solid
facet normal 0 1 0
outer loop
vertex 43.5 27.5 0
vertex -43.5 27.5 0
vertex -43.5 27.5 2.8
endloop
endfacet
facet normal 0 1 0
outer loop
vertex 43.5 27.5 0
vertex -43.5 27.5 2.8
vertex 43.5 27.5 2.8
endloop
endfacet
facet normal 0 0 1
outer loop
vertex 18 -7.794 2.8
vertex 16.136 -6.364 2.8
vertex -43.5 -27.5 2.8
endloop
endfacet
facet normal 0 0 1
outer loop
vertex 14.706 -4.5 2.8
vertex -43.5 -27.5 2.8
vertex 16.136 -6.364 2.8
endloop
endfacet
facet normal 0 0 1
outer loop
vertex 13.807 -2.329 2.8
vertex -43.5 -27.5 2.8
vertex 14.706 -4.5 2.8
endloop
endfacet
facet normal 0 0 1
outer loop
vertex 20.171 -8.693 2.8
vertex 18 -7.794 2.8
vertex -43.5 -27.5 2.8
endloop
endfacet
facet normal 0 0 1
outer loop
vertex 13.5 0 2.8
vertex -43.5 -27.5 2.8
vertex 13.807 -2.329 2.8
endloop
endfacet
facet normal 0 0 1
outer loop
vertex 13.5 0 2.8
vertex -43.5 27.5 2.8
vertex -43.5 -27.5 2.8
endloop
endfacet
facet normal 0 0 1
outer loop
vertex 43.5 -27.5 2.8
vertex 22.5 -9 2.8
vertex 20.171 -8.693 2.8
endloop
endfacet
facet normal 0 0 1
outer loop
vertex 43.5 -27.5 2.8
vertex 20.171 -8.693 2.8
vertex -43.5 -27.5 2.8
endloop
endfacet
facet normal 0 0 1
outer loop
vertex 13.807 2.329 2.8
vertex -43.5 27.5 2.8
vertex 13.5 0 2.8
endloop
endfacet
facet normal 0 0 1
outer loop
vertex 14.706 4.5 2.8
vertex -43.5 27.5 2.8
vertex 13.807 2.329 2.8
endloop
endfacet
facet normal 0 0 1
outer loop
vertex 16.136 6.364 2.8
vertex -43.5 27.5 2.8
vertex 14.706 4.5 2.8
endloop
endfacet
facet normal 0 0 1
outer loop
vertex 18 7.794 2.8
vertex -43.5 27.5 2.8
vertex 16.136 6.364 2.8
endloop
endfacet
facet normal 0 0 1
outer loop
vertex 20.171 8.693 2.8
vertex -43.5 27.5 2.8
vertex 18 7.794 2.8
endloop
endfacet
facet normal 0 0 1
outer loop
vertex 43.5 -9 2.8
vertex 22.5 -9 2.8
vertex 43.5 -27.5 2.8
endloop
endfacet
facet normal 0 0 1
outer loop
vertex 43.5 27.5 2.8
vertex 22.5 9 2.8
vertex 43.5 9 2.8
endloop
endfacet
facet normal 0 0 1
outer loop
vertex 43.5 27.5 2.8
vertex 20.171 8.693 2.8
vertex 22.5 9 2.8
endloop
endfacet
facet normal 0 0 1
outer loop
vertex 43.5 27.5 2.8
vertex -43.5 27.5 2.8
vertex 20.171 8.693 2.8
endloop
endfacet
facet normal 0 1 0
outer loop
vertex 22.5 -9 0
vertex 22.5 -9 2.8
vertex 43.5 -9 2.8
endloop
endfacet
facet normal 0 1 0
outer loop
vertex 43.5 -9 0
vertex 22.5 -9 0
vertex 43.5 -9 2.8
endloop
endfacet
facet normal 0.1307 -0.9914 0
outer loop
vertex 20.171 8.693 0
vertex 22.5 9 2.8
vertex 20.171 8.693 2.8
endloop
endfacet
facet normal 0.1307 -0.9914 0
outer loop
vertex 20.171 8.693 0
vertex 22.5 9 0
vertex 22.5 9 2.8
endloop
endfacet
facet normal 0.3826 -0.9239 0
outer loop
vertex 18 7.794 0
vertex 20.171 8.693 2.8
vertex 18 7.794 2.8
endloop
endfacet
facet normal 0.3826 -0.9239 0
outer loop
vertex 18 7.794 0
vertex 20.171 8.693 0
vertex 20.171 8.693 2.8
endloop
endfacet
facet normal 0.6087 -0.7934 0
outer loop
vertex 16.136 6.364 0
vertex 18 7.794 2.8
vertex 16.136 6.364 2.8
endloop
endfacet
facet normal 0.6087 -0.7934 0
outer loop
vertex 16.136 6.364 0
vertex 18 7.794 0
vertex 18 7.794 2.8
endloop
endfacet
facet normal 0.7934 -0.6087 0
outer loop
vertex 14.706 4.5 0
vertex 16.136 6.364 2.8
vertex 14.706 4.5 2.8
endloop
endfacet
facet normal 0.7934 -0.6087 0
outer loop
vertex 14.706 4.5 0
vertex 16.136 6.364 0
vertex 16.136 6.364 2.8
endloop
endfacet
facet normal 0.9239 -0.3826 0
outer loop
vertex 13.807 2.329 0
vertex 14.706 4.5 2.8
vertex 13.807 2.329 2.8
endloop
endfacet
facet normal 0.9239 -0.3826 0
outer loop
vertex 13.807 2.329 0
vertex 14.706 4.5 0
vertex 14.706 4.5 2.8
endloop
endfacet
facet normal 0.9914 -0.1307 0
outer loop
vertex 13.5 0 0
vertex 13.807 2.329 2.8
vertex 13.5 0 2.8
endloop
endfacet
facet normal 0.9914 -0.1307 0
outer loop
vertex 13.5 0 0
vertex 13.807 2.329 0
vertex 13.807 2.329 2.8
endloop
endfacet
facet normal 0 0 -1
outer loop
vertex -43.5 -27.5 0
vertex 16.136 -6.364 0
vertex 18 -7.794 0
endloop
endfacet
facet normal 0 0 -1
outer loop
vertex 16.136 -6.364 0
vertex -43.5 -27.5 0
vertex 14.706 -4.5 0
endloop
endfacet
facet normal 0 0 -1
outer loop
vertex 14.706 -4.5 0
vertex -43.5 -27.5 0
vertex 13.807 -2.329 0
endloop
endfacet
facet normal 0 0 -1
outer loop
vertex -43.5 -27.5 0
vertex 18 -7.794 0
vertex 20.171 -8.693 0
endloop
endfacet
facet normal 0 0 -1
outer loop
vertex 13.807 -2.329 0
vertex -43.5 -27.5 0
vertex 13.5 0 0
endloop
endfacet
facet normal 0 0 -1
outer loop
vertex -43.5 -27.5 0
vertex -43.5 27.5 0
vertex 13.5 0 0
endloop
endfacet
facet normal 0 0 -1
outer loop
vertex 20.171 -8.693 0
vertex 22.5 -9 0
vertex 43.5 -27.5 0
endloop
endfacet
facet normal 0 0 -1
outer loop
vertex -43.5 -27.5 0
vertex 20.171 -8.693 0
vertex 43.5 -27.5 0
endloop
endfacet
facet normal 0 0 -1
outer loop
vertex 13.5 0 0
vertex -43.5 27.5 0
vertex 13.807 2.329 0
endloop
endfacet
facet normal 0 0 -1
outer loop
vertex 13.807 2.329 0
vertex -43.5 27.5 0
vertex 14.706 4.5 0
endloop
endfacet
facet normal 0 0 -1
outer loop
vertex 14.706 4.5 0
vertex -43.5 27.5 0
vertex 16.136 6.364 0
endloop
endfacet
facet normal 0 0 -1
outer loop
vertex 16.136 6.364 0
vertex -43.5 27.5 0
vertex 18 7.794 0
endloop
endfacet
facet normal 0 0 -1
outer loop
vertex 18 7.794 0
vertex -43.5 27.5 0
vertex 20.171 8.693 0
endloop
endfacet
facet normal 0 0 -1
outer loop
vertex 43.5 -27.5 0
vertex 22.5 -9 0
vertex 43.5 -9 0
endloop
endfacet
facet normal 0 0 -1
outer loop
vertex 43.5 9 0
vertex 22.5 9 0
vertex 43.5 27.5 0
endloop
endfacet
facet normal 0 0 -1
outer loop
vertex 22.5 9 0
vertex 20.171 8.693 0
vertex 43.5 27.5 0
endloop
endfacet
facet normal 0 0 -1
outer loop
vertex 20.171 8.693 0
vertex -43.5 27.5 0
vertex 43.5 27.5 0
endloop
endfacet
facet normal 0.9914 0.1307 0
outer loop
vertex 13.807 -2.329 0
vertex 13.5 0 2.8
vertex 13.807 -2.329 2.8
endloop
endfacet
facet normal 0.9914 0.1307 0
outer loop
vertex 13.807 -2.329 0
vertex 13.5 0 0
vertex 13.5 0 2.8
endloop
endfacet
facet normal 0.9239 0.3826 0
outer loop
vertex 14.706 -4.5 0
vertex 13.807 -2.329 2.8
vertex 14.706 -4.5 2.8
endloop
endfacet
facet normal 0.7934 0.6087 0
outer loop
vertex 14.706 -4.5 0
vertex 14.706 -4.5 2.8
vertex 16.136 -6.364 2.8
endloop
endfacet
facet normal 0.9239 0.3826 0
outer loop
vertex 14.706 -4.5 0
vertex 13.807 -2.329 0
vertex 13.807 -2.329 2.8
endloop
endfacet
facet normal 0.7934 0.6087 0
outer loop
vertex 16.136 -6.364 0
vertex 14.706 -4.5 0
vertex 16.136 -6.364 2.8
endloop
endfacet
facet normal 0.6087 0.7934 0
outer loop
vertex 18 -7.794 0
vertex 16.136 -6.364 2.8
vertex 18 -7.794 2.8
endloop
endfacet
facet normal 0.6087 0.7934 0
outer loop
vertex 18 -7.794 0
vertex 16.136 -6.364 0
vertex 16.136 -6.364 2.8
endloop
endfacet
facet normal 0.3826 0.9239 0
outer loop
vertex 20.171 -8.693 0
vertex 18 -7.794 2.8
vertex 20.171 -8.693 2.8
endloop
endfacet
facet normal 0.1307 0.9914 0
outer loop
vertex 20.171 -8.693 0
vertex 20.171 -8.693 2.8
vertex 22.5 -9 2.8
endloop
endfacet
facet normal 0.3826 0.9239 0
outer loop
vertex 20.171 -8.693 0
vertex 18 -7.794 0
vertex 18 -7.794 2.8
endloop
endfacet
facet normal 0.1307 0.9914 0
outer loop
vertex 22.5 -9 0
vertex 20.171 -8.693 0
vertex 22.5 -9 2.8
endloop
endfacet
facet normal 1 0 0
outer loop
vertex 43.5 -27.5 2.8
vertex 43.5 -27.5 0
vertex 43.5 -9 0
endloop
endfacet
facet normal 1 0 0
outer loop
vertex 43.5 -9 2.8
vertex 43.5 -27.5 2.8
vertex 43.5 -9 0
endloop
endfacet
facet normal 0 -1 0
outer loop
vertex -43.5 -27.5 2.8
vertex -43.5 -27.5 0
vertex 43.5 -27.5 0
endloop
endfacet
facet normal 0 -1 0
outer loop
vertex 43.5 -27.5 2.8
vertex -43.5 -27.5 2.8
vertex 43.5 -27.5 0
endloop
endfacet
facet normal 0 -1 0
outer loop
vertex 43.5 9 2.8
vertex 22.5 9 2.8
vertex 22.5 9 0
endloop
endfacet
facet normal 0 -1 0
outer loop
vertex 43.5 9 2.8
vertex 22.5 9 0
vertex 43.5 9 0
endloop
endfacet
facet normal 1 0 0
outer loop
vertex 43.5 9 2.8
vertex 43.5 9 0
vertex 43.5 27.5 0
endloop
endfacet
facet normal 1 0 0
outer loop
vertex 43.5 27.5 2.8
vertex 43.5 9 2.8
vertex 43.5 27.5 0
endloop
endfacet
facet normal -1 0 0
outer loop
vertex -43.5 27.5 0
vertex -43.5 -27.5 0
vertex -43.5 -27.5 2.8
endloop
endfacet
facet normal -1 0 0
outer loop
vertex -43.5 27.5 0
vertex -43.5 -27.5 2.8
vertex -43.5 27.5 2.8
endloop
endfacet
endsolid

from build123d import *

# Parameters (mm, degrees)
F0_W     = 87
F0_H     = 55
F1_DEPTH = 2.8
F2_W     = 60
F2_H     = 18
F3_DEPTH = 25
F4_R     = 8.99999


# Not quite as in the source:
# - a fillet or chamfer is up to 0.001 mm smaller than in the source, because OpenCascade refuses the exact size


with BuildPart() as f1:
    # F0 (on Top) → F1 (new body)
    with BuildSketch(Plane.XY):
        Rectangle(F0_W, F0_H)
    extrude(amount=F1_DEPTH)

    # F2 (on face) → F3 (cut)
    with BuildSketch(Plane.XY.offset(2.8)):
        with Locations((43.5, 0)):
            Rectangle(F2_W, F2_H)
    extrude(amount=-F3_DEPTH, mode=Mode.SUBTRACT)

    # F4 (radius 9 in the source; OpenCascade refuses exactly that, so slightly less here)
    f4_edges = [f1.edges().sort_by_distance(p)[0] for p in [
        (13.5, 9, 1.4),
        (13.5, -9, 1.4),
    ]]
    fillet(f4_edges, radius=F4_R)


solid = f1.part
